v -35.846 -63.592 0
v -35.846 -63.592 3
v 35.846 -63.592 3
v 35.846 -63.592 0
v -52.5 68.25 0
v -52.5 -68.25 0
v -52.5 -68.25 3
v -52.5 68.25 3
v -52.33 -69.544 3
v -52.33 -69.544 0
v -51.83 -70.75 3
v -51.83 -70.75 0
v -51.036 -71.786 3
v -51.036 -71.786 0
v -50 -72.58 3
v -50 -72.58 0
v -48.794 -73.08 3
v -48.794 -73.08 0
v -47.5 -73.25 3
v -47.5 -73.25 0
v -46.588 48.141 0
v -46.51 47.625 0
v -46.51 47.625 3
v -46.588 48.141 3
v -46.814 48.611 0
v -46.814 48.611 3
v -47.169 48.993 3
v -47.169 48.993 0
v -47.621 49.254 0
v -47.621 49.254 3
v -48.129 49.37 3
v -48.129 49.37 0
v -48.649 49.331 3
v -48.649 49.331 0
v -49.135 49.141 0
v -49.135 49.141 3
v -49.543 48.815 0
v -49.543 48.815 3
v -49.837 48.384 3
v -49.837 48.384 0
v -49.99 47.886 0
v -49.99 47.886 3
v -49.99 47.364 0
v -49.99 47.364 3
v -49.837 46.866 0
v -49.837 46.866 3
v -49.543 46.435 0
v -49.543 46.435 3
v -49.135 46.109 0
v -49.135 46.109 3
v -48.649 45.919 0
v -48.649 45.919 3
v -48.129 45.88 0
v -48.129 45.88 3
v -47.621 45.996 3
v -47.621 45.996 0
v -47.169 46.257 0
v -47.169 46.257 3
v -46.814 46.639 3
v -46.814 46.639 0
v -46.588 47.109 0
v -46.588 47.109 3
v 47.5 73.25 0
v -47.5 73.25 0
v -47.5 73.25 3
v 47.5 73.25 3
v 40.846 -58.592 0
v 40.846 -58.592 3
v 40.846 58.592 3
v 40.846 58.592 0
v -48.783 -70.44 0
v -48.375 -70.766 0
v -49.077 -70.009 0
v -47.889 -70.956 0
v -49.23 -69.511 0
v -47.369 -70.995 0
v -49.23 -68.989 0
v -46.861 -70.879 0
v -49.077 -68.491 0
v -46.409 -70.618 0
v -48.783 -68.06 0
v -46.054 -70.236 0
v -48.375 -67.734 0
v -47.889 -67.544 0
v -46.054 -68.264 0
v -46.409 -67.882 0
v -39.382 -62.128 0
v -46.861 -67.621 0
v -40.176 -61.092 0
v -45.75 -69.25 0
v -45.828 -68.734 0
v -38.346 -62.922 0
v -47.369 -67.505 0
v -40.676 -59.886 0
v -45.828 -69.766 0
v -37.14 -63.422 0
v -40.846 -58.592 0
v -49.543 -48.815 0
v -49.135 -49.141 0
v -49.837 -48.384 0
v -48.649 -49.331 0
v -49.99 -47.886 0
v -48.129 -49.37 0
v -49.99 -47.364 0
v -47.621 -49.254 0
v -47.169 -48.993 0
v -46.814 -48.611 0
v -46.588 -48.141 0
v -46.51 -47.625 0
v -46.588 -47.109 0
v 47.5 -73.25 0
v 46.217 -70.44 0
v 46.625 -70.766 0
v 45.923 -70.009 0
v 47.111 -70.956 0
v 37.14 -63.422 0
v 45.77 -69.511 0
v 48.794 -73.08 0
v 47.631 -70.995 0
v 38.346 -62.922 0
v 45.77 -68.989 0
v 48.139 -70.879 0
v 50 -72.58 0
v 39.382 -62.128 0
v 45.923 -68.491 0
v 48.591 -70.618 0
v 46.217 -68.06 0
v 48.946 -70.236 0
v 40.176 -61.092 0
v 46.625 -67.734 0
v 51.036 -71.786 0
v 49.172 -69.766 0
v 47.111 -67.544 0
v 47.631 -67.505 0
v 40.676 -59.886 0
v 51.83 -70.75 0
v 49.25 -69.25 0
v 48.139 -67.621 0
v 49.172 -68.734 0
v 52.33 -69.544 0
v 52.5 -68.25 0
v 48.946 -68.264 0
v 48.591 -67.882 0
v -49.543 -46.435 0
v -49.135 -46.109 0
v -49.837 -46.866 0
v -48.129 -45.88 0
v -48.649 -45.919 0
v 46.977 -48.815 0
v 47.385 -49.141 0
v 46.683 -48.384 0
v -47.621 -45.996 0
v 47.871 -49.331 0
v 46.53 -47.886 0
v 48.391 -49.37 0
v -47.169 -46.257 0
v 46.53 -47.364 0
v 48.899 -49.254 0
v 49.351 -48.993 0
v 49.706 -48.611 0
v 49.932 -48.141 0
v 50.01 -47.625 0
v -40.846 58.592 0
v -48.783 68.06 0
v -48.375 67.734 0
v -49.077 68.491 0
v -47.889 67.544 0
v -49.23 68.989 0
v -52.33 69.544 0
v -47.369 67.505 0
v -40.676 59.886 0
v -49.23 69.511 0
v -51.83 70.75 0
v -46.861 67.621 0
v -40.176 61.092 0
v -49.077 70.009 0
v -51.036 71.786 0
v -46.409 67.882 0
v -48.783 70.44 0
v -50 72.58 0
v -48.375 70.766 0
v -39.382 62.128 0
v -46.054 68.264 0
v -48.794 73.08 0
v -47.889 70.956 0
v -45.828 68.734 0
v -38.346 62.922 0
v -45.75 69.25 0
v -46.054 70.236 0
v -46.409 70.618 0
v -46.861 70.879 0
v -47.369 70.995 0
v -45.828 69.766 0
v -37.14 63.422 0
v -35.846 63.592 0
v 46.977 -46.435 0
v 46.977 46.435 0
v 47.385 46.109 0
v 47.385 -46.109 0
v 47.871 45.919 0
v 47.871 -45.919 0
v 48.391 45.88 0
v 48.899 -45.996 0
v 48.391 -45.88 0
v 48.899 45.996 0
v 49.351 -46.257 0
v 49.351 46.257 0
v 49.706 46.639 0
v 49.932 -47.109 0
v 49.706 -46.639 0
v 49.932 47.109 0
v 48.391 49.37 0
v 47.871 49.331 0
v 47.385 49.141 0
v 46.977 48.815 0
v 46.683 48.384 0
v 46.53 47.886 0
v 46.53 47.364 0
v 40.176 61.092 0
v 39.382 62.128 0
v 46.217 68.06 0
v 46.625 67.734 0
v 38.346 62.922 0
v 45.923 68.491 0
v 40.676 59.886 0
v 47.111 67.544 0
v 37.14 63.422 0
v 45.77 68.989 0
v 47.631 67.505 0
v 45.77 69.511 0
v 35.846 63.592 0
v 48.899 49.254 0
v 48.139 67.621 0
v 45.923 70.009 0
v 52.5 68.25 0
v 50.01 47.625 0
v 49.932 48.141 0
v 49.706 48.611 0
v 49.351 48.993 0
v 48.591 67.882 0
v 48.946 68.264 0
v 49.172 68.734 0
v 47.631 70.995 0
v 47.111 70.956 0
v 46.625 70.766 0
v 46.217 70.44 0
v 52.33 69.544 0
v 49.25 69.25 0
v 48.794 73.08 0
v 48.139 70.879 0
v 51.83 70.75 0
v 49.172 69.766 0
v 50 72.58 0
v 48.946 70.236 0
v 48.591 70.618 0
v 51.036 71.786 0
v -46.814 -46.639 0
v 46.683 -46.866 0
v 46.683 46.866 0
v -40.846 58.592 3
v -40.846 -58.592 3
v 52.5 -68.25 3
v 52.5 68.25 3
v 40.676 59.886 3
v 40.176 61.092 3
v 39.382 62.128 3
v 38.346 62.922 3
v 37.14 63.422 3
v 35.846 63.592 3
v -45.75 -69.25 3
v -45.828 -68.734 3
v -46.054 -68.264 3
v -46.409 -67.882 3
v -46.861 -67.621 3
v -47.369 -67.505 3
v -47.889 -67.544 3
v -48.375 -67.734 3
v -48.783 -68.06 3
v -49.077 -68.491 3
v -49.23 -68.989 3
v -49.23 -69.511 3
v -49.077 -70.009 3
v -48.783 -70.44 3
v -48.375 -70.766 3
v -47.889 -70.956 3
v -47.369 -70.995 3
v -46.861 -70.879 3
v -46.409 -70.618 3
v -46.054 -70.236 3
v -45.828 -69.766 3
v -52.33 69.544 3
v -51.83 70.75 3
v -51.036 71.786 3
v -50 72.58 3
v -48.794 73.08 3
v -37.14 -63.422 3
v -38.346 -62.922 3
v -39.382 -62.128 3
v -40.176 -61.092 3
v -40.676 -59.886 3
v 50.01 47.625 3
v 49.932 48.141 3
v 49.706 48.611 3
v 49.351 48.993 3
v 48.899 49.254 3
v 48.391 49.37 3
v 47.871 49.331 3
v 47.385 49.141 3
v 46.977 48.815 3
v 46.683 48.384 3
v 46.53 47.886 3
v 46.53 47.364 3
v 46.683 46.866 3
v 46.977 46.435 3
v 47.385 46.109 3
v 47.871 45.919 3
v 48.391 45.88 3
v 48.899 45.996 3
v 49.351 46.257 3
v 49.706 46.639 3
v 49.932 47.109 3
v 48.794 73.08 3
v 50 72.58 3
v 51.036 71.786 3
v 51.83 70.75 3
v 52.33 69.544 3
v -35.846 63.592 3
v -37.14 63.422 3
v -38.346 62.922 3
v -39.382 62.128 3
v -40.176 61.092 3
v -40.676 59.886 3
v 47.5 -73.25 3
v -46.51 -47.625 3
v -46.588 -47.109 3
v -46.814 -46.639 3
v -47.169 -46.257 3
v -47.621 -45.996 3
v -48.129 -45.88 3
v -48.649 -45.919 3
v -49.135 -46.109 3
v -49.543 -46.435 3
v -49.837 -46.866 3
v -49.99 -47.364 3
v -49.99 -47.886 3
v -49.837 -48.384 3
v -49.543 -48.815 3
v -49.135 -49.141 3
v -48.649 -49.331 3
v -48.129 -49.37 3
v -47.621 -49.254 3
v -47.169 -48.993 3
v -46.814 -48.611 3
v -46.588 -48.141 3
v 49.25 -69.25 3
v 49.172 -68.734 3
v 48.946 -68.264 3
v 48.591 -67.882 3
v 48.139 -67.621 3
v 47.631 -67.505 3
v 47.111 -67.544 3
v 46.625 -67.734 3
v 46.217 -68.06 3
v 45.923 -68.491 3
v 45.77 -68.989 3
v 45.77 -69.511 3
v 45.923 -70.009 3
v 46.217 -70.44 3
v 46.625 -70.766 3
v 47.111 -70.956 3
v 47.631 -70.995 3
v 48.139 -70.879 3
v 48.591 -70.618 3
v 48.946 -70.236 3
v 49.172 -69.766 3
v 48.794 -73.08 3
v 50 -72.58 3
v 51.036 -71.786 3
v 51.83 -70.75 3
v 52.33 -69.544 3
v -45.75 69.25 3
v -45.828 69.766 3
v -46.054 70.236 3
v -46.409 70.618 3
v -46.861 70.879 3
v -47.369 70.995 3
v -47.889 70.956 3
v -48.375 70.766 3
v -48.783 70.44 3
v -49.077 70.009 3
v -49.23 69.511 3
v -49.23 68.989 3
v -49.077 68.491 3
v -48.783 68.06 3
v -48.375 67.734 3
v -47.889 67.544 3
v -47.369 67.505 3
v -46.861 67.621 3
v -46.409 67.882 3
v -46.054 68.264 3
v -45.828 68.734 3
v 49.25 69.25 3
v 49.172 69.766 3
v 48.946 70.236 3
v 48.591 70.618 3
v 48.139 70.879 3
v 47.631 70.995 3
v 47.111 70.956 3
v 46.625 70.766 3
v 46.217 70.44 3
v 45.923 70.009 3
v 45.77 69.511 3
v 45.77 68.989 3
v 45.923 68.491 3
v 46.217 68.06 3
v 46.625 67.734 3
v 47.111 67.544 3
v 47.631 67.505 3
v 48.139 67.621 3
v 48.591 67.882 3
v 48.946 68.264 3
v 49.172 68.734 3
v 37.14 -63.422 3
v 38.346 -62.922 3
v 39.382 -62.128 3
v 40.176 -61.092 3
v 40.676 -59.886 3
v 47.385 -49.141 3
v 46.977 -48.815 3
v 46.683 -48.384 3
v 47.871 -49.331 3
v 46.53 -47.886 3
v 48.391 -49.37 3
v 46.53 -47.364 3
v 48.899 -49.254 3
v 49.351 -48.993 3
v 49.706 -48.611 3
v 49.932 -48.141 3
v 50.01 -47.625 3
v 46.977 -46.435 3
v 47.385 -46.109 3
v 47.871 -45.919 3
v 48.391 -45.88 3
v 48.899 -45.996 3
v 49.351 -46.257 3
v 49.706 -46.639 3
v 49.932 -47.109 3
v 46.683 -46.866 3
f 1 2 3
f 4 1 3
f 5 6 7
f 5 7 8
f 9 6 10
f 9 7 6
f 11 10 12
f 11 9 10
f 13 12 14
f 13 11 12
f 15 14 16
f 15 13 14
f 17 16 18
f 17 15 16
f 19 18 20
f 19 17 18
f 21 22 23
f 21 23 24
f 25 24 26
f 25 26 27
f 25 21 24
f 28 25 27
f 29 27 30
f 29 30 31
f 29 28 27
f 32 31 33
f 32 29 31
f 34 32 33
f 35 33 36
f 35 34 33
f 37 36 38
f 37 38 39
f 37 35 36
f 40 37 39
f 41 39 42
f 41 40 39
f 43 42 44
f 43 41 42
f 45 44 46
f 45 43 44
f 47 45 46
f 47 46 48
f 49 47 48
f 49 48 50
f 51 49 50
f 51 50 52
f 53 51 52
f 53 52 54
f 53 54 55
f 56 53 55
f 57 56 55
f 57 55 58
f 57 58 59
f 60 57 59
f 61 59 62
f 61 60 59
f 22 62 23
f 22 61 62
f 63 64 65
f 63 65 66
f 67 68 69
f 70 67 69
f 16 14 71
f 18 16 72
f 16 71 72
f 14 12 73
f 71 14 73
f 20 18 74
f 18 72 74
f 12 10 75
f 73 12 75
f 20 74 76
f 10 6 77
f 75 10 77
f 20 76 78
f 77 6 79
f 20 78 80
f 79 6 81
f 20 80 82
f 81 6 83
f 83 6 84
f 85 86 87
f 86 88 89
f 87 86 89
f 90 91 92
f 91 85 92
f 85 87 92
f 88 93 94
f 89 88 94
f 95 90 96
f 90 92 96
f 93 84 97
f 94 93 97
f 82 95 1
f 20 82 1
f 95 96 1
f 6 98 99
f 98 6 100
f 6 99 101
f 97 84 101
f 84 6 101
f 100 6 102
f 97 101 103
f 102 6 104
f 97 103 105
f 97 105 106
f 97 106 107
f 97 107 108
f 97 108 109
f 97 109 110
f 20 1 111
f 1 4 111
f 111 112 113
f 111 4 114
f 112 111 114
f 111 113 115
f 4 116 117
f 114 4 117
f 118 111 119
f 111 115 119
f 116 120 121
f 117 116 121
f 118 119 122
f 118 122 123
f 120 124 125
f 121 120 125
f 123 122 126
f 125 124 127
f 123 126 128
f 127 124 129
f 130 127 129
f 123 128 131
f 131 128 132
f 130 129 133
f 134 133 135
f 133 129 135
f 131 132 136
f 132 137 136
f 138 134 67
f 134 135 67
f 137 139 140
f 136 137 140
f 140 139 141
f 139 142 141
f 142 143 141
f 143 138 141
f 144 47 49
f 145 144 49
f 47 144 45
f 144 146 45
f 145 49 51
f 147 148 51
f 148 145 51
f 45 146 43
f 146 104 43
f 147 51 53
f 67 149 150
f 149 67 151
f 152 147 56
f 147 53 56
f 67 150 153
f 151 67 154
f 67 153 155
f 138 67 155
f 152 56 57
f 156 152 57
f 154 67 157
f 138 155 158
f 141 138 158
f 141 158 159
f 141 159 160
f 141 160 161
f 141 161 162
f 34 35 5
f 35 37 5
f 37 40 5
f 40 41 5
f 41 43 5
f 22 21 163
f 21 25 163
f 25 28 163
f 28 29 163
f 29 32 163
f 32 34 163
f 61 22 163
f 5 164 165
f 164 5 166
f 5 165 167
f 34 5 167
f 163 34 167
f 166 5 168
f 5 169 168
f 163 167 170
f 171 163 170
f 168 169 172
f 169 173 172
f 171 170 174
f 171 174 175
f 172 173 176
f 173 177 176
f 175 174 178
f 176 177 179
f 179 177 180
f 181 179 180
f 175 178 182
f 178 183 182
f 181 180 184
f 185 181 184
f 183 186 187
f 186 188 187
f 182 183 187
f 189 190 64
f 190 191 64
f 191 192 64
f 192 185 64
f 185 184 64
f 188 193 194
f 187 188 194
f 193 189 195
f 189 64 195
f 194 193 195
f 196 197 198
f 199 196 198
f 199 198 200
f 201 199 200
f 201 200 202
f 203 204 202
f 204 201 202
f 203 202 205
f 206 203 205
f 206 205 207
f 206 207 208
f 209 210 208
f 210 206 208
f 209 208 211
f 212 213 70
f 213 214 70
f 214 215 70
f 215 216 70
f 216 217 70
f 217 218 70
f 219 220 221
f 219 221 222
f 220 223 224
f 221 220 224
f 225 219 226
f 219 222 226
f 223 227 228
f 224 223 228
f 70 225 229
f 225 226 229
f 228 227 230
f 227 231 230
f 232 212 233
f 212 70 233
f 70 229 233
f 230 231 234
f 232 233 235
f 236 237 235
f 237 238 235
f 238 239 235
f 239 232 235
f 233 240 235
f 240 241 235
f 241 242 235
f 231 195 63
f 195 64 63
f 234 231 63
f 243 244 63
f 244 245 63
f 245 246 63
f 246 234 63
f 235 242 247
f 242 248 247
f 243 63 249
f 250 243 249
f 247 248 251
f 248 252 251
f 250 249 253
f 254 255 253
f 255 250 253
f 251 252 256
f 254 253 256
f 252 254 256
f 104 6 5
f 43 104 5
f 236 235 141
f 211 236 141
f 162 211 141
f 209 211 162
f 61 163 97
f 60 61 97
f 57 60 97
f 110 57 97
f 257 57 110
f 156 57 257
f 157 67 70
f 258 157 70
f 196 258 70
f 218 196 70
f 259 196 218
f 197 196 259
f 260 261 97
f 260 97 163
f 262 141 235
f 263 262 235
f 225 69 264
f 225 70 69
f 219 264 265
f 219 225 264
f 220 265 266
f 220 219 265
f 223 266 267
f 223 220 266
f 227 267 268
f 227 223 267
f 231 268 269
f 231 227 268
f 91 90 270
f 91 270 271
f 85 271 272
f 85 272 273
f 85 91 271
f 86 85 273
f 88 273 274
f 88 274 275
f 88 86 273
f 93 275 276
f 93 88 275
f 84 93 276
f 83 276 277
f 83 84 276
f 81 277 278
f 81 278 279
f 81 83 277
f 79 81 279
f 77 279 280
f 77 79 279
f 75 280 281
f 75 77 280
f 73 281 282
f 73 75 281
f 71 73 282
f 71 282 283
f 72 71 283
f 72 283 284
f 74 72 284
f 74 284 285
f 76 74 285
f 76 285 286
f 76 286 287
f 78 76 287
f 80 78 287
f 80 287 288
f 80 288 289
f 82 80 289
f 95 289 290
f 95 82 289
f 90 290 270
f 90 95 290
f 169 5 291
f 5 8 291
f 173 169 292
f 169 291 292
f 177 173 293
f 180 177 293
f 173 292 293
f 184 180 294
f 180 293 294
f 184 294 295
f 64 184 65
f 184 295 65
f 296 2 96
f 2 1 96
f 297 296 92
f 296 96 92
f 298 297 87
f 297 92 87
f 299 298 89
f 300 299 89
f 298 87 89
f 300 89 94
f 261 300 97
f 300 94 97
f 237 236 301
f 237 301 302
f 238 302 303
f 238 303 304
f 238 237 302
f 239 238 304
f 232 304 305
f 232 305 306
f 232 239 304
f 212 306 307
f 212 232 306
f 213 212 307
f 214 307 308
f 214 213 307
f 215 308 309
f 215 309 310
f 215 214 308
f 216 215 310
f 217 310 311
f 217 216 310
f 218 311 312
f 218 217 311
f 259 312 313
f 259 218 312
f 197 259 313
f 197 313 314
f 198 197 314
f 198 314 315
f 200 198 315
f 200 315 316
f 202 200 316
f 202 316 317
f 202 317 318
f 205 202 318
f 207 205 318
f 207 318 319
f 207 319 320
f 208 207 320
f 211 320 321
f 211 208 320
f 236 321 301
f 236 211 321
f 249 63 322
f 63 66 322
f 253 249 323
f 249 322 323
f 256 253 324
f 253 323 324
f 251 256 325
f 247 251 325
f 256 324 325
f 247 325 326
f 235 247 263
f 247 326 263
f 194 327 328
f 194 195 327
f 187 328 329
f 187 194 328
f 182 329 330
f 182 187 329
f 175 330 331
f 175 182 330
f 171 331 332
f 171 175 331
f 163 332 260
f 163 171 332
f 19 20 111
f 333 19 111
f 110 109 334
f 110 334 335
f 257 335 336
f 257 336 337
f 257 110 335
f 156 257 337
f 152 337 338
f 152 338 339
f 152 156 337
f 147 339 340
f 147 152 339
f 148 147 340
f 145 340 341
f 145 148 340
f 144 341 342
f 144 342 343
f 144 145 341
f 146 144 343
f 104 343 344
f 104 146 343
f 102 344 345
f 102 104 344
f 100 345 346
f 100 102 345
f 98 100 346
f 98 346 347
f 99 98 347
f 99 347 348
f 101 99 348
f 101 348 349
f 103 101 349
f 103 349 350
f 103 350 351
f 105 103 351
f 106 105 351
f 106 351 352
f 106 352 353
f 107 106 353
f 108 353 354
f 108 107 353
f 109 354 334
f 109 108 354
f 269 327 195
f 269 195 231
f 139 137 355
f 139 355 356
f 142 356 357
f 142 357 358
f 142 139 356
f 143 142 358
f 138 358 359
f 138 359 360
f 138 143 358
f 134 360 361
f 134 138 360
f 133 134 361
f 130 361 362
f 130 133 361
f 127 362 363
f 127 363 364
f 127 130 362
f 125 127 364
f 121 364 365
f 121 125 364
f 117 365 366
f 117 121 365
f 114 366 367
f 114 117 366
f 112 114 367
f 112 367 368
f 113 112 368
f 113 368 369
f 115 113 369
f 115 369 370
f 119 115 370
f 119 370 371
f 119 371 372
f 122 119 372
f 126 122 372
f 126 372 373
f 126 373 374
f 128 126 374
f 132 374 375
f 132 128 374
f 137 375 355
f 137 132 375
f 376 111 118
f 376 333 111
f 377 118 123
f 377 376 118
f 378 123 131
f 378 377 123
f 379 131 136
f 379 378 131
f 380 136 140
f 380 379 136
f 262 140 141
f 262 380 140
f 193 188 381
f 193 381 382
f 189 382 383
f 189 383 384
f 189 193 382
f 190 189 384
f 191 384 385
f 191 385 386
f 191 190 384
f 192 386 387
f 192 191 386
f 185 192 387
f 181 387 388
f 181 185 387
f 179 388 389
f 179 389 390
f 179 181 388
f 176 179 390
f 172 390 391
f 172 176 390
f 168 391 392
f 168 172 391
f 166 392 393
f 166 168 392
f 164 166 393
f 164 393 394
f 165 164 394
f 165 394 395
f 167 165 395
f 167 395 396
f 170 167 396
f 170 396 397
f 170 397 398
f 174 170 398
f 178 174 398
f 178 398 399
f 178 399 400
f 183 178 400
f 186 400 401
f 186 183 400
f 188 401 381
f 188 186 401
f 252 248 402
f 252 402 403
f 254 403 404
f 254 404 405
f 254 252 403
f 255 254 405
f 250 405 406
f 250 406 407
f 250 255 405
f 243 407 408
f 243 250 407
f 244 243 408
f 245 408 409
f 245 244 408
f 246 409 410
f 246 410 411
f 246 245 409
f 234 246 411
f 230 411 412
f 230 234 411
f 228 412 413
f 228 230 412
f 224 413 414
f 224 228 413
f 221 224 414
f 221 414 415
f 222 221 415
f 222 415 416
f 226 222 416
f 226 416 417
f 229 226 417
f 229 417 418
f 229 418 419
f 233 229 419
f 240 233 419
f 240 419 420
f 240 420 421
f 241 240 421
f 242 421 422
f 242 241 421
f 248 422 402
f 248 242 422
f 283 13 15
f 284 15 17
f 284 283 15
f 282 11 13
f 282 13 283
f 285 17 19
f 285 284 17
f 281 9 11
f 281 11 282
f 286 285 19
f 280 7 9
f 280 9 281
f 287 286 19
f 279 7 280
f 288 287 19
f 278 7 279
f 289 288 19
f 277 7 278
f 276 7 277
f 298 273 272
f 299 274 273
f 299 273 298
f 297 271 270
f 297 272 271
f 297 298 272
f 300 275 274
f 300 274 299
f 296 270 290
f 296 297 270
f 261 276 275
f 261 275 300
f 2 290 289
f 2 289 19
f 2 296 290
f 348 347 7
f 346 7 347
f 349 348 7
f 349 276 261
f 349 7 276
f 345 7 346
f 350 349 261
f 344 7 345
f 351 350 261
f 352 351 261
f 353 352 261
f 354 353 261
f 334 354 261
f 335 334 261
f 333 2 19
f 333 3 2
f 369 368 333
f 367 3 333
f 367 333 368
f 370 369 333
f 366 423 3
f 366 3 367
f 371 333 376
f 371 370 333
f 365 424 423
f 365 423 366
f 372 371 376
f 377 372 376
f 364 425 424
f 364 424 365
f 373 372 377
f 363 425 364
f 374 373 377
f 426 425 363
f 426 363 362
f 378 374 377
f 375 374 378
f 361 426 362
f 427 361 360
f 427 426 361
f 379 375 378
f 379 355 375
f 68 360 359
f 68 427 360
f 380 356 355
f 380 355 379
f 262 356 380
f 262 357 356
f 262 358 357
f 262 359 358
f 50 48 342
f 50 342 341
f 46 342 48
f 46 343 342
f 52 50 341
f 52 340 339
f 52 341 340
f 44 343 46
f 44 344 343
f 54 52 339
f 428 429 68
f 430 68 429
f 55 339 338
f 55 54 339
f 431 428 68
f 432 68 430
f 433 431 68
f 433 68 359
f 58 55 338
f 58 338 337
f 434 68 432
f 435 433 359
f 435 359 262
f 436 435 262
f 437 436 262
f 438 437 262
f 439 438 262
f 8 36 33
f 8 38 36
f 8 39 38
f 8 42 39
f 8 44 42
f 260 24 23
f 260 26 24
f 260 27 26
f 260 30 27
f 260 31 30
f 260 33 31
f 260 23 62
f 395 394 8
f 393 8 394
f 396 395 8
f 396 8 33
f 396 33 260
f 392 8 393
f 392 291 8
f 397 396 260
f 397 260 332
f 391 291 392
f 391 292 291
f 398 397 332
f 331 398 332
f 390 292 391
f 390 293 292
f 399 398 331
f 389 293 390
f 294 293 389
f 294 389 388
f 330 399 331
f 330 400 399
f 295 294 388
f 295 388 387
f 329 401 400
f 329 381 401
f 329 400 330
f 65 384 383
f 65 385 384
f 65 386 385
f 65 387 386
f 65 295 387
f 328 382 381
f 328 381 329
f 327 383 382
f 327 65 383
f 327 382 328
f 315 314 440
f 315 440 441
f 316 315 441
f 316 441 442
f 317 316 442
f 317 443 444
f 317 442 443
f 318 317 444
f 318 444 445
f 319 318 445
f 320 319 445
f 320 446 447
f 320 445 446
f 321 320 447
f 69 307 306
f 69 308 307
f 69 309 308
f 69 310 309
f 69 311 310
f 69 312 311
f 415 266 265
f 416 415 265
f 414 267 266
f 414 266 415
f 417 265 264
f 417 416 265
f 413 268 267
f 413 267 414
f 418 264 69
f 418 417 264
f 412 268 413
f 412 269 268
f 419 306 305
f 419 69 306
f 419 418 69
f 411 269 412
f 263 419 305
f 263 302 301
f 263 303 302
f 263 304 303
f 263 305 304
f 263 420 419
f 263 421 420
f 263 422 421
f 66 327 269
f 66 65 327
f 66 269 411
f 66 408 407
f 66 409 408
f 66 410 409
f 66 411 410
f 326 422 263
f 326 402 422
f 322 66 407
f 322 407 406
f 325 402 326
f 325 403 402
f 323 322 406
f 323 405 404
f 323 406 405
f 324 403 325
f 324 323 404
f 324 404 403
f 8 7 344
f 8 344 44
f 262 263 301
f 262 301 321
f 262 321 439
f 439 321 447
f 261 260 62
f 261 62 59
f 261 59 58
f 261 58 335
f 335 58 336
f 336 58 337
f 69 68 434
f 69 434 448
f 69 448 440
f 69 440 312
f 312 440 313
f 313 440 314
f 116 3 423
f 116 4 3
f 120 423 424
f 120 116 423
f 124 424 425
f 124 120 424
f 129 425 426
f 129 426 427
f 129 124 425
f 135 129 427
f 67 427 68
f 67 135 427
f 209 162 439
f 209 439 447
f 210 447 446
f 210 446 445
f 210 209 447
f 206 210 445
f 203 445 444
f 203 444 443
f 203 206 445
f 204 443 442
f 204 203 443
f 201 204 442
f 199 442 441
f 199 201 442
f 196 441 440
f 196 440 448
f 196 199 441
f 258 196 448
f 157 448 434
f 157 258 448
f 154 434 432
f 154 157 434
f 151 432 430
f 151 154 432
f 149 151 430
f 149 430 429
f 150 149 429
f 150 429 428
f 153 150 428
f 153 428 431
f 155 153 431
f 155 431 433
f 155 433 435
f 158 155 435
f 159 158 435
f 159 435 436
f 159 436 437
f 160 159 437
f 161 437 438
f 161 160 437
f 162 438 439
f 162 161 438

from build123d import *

# Parameters (mm, degrees)
F0_W     = 105
F0_H     = 146.5
F0_R     = 1.75
F1_DEPTH = 3
F2_W     = 81.692316
F2_H     = 127.184674
F3_DEPTH = 25
F4_R     = 5


with BuildPart() as f1:
    # F0 (on Top) → F1 (new body)
    with BuildSketch(Plane.XY):
        Rectangle(F0_W, F0_H)
        with Locations((-47.5, -69.25)):
            Circle(F0_R, mode=Mode.SUBTRACT)
        with Locations((-48.26, -47.625)):
            Circle(F0_R, mode=Mode.SUBTRACT)
        with Locations((47.5, -69.25)):
            Circle(F0_R, mode=Mode.SUBTRACT)
        with Locations((48.26, -47.625)):
            Circle(F0_R, mode=Mode.SUBTRACT)
        with Locations((-48.26, 47.625)):
            Circle(F0_R, mode=Mode.SUBTRACT)
        with Locations((-47.5, 69.25)):
            Circle(F0_R, mode=Mode.SUBTRACT)
        with Locations((48.26, 47.625)):
            Circle(F0_R, mode=Mode.SUBTRACT)
        with Locations((47.5, 69.25)):
            Circle(F0_R, mode=Mode.SUBTRACT)
    extrude(amount=F1_DEPTH)

    # F2 (on face) → F3 (cut)
    with BuildSketch(Plane.XY.offset(3)):
        Rectangle(F2_W, F2_H)
    extrude(amount=-F3_DEPTH, mode=Mode.SUBTRACT)

    # F4
    f4_edges = [f1.edges().sort_by_distance(p)[0] for p in [
        (-52.5, 73.25, 1.5),
        (-52.5, -73.25, 1.5),
        (52.5, -73.25, 1.5),
        (-40.846158, 63.592337, 1.5),
        (52.5, 73.25, 1.5),
        (40.846158, 63.592337, 1.5),
        (40.846158, -63.592337, 1.5),
        (-40.846158, -63.592337, 1.5),
    ]]
    fillet(f4_edges, radius=F4_R)


solid = f1.part
